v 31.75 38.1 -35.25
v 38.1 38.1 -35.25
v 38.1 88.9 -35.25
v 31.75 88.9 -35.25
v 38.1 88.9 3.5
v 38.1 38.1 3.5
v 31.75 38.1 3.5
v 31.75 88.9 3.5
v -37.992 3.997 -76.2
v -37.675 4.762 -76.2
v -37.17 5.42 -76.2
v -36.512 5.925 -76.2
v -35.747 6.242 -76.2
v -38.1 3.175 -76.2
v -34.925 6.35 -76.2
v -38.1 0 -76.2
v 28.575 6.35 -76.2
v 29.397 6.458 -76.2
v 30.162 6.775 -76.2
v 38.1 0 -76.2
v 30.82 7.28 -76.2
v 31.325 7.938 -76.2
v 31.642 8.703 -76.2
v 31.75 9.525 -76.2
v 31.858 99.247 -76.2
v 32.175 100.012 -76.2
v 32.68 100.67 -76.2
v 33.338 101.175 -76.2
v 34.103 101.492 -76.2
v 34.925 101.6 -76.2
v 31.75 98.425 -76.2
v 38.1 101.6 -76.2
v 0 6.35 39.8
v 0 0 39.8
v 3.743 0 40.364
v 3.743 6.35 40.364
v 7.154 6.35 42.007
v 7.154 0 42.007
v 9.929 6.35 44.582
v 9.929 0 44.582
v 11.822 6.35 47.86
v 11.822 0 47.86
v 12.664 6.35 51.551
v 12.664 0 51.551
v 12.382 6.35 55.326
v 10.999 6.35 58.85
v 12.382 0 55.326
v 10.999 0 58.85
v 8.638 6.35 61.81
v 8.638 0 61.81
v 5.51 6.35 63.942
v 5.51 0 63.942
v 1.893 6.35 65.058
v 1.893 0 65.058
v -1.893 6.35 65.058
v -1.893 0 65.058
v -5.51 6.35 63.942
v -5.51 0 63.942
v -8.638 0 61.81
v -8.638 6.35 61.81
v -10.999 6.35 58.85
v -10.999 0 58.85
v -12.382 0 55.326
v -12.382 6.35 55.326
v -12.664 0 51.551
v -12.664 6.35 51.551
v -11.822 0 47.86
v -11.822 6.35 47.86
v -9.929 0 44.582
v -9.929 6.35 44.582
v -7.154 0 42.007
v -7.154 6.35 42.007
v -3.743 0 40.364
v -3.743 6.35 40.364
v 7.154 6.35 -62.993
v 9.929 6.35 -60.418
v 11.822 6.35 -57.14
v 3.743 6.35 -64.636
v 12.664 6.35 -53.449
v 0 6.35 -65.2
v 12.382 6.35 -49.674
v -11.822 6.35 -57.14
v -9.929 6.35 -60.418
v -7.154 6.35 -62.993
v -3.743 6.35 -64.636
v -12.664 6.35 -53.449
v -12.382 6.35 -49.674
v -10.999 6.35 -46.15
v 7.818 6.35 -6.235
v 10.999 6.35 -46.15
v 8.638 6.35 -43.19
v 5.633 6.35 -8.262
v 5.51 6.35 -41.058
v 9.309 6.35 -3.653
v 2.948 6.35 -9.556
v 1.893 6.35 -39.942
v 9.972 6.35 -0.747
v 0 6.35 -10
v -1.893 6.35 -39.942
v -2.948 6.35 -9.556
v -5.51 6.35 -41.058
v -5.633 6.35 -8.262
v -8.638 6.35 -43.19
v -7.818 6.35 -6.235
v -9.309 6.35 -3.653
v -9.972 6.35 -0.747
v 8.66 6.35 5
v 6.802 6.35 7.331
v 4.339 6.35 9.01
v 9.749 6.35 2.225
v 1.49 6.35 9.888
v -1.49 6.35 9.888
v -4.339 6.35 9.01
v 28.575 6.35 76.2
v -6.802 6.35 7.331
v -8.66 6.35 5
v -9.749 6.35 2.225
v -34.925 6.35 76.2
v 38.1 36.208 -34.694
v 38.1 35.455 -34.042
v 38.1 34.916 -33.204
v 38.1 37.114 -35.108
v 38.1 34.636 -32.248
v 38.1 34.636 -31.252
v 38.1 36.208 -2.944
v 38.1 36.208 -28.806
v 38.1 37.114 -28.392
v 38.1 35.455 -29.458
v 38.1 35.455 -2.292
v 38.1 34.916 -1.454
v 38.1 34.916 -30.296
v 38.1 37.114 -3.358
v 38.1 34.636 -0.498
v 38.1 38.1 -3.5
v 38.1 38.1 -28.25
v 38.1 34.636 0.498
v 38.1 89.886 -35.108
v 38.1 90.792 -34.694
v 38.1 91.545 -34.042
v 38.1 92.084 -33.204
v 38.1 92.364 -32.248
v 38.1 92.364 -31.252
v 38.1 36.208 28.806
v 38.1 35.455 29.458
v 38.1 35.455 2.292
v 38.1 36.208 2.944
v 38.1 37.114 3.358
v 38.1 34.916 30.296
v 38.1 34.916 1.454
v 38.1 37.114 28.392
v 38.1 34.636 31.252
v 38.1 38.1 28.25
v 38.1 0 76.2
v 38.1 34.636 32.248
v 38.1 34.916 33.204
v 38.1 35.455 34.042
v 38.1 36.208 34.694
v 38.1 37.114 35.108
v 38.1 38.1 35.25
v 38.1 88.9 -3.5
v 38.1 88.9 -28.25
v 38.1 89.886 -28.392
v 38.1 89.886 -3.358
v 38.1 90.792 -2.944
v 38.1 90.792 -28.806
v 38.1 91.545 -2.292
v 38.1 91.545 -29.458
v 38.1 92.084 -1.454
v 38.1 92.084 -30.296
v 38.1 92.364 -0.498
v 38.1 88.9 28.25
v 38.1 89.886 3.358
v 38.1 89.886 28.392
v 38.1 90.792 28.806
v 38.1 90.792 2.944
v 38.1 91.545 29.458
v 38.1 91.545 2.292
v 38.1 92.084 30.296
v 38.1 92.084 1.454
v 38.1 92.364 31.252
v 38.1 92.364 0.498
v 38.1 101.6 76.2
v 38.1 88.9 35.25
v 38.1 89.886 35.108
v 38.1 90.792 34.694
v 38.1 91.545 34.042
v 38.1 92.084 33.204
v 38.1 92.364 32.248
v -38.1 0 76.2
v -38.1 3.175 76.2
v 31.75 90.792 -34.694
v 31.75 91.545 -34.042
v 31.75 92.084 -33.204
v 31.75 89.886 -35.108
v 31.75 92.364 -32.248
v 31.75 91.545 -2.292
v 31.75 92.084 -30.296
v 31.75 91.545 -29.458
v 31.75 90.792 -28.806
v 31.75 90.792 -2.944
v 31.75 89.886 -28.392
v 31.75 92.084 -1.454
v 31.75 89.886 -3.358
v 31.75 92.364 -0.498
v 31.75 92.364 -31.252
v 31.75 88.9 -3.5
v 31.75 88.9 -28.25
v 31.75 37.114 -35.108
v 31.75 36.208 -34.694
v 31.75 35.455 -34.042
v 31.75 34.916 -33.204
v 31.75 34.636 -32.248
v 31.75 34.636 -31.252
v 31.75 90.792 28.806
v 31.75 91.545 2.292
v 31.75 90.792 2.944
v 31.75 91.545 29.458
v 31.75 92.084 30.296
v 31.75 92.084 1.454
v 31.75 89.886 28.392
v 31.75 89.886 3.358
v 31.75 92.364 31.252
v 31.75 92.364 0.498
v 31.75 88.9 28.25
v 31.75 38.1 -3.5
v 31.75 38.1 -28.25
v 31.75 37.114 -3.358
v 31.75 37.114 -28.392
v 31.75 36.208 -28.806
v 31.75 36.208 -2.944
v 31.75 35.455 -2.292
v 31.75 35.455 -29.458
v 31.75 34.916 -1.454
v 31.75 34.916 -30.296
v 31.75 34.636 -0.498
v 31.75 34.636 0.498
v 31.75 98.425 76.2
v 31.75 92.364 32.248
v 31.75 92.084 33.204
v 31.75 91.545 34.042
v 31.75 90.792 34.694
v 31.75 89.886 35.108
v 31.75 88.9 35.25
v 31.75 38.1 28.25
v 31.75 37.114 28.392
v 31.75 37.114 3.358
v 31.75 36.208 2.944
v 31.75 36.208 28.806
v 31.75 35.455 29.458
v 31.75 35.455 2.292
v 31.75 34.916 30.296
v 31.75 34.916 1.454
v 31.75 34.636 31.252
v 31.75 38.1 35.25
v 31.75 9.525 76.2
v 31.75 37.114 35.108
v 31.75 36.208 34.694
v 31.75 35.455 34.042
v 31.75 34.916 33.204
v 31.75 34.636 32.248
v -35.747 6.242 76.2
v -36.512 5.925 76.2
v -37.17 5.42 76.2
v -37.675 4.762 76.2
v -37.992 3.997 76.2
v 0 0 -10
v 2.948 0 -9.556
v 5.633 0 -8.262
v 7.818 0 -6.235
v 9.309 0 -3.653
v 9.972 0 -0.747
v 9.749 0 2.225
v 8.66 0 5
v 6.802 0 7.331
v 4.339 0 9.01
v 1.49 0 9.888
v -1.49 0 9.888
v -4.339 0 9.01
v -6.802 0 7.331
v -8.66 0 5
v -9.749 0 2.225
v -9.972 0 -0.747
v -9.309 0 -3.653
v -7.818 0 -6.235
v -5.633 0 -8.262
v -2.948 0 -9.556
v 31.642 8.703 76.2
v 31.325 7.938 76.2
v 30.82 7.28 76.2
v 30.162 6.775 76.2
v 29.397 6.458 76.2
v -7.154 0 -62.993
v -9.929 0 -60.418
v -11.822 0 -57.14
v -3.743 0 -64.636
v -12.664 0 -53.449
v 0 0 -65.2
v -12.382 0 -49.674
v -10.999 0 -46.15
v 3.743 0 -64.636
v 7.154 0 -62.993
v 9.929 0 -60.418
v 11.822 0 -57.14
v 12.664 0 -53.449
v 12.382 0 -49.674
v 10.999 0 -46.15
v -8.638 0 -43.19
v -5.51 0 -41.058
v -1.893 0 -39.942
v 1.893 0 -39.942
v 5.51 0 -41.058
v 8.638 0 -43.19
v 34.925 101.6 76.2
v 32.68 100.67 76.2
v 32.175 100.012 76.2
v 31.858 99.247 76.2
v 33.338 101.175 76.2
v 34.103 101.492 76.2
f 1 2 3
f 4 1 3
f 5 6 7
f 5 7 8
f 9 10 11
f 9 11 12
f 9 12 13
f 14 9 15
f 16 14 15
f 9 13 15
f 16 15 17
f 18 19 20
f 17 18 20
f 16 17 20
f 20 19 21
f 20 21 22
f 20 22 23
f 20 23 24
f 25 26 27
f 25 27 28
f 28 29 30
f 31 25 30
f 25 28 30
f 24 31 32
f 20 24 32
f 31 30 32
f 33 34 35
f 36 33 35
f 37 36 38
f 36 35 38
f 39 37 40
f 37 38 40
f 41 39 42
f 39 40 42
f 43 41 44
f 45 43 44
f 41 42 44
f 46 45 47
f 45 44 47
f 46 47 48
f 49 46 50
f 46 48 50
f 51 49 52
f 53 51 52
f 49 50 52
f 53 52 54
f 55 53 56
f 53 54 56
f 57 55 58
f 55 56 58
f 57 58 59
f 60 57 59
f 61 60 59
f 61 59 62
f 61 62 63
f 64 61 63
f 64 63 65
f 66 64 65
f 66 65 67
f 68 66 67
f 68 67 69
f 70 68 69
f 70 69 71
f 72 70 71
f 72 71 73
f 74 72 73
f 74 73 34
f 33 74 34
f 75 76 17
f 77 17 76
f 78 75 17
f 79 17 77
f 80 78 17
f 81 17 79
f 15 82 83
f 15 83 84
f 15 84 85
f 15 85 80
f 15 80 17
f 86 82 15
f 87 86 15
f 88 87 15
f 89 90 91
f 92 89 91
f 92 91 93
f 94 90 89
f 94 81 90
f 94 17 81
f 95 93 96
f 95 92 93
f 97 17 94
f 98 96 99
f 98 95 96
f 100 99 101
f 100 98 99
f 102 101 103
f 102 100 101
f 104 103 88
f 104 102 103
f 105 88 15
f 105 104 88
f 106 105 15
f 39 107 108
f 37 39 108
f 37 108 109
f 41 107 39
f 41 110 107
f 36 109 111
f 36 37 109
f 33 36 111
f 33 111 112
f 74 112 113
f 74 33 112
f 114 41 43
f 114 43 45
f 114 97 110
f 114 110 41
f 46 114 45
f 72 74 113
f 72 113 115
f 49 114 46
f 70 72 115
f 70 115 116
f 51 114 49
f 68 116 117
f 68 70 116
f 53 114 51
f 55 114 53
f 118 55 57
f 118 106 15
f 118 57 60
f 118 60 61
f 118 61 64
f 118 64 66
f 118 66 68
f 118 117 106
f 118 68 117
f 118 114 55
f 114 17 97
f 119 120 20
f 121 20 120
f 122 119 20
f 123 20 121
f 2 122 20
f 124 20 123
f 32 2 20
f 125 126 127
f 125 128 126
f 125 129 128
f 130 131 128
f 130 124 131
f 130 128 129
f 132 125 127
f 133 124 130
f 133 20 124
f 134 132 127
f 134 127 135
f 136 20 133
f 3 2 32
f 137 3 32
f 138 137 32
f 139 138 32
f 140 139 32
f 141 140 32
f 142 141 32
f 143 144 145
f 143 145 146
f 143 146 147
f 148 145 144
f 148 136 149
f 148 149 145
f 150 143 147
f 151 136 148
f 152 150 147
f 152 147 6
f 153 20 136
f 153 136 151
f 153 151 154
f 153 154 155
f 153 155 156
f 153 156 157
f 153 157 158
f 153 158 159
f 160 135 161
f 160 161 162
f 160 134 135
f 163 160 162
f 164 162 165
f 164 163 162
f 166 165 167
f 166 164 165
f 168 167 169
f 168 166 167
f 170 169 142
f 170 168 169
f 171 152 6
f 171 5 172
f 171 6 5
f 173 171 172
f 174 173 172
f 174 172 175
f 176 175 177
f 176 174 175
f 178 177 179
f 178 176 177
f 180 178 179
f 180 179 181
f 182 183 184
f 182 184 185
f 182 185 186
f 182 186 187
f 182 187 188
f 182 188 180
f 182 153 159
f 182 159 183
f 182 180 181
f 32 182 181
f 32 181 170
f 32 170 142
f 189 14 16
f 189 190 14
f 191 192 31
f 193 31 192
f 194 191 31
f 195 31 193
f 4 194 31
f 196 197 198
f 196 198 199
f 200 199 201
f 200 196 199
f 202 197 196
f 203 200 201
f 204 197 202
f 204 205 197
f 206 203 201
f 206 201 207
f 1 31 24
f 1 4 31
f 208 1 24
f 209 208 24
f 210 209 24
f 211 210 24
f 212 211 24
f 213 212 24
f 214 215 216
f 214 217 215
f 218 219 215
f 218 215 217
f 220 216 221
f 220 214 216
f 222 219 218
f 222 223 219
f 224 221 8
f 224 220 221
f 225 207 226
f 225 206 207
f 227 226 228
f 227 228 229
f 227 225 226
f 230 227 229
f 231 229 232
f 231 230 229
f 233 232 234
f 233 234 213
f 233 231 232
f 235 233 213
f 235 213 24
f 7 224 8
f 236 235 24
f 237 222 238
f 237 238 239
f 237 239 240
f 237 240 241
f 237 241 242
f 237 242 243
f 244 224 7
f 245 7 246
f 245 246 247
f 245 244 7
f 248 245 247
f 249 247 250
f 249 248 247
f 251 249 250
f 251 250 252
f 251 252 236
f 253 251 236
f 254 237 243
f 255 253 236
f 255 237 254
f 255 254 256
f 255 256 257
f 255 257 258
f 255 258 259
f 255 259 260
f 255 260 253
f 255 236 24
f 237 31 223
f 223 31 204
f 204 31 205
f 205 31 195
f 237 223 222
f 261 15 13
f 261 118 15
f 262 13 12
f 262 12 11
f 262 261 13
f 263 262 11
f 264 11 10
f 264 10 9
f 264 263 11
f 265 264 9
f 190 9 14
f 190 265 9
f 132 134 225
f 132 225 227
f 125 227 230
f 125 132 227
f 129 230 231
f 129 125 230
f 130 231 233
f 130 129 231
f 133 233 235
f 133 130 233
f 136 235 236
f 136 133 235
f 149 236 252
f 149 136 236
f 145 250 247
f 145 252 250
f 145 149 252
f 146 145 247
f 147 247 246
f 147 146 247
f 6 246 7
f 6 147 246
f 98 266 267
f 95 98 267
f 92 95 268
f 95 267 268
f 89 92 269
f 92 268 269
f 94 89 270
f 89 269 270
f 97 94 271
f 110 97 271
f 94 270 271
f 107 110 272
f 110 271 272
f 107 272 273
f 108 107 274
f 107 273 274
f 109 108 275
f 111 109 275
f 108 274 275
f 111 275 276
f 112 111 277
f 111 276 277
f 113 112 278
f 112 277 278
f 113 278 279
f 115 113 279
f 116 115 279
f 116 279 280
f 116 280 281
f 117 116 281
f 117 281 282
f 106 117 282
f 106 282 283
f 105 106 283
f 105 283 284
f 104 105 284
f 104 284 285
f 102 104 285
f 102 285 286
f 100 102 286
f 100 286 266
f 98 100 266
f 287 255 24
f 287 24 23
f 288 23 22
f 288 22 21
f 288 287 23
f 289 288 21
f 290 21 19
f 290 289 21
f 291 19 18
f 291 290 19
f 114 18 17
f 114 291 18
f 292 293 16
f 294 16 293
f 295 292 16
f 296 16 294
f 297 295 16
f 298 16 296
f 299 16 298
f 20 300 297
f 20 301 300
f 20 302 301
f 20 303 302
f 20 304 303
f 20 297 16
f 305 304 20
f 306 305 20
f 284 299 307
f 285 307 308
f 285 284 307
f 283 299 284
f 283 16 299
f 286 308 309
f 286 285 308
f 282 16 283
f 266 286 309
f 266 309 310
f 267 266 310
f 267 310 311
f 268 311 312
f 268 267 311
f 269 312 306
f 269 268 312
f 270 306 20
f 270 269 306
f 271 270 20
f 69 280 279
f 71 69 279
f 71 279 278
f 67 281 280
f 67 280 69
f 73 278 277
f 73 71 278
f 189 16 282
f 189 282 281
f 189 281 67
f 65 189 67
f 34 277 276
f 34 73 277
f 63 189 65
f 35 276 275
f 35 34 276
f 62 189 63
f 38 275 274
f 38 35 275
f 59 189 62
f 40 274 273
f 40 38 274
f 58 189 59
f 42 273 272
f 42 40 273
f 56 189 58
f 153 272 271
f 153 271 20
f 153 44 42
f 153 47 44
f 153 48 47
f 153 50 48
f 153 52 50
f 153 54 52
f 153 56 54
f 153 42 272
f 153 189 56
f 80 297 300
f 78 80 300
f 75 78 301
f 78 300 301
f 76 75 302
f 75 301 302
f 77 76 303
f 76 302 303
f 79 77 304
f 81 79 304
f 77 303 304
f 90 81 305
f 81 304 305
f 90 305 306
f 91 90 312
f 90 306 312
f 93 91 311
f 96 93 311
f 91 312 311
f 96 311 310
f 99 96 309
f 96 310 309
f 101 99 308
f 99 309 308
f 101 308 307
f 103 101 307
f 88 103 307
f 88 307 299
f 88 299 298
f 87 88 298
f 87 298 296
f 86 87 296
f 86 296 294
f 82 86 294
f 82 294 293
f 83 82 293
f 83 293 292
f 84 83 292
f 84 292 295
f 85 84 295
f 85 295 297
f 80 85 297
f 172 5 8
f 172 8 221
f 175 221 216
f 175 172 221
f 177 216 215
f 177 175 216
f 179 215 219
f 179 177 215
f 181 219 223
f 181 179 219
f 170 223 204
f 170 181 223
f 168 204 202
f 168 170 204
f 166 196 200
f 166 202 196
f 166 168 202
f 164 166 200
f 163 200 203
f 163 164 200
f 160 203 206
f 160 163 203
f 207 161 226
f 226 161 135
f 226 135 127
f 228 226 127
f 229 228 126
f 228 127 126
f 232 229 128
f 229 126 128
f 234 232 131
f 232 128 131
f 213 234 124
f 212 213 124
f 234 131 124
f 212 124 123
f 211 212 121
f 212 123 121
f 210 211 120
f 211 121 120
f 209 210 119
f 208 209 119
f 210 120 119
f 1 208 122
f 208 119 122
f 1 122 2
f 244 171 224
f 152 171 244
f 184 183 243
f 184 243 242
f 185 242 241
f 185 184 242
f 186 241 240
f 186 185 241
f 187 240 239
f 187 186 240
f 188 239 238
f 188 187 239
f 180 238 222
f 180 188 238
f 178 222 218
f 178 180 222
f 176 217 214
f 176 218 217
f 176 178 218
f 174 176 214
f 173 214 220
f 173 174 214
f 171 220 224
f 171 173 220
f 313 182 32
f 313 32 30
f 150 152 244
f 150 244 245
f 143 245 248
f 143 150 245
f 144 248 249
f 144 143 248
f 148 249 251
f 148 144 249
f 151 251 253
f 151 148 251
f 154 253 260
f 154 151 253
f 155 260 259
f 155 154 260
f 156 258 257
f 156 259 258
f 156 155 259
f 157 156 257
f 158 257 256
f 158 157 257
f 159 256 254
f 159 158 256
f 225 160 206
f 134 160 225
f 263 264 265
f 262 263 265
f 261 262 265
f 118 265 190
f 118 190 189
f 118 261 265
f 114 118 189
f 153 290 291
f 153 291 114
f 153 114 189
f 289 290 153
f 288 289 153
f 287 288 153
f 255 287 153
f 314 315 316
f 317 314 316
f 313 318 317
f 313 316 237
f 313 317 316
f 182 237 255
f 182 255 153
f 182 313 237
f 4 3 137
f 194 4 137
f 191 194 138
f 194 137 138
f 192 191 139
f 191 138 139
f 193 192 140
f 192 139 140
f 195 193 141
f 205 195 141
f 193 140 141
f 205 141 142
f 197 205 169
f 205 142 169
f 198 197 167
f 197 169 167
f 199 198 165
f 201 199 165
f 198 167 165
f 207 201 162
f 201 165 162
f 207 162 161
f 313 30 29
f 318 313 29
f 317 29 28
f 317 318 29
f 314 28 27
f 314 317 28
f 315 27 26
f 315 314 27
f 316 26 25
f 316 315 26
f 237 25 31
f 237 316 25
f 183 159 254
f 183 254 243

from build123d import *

# Parameters (mm, degrees)
BOSS_EXTRUDE1_DEPTH = 76.2
CUT_EXTRUDE1_DEPTH  = 10
SKETCH4_R           = 10
SKETCH4_R_2         = 12.7
CUT_EXTRUDE2_DEPTH  = 10


with BuildPart() as part:
    # Sketch2 → Boss-Extrude1 (new, symmetric)
    with BuildSketch(Plane.XY):
        with BuildLine():
            Line((-38.1, 0), (38.1, 0))
            Line((38.1, 0), (38.1, 101.6))
            Line((38.1, 101.6), (34.925, 101.6))
            ThreePointArc((34.925, 101.6), (32.67993597, 100.67006403), (31.75, 98.425))
            Line((31.75, 98.425), (31.75, 9.525))
            ThreePointArc((31.75, 9.525), (30.82006403, 7.27993597), (28.575, 6.35))
            Line((28.575, 6.35), (-34.925, 6.35))
            ThreePointArc((-34.925, 6.35), (-37.17006403, 5.42006403), (-38.1, 3.175))
            Line((-38.1, 3.175), (-38.1, 0))
        make_face()
    extrude(amount=BOSS_EXTRUDE1_DEPTH, both=True)

    # Sketch3 → Cut-Extrude1 (cut)
    with BuildSketch(Plane(origin=(38.1, 0, 0), x_dir=(0, 0, -1), z_dir=(1, 0, 0))):
        with BuildLine():
            Line((-28.25, 88.9), (-28.25, 38.1))
            ThreePointArc((-28.25, 38.1), (-31.75, 34.6), (-35.25, 38.1))
            Line((-35.25, 38.1), (-35.25, 88.9))
            ThreePointArc((-35.25, 88.9), (-31.75, 92.4), (-28.25, 88.9))
        make_face()
        with BuildLine():
            Line((28.25, 88.9), (28.25, 38.1))
            ThreePointArc((28.25, 38.1), (31.75, 34.6), (35.25, 38.1))
            Line((35.25, 38.1), (35.25, 88.9))
            ThreePointArc((35.25, 88.9), (31.75, 92.4), (28.25, 88.9))
        make_face()
        with BuildLine():
            Line((3.5, 88.9), (3.5, 38.1))
            ThreePointArc((3.5, 38.1), (0, 34.6), (-3.5, 38.1))
            Line((-3.5, 38.1), (-3.5, 88.9))
            ThreePointArc((-3.5, 88.9), (0, 92.4), (3.5, 88.9))
        make_face()
    extrude(amount=-CUT_EXTRUDE1_DEPTH, mode=Mode.SUBTRACT)

    # Sketch4 → Cut-Extrude2 (cut)
    with BuildSketch(Plane.XZ):
        with Locations(Location((0, 0, 0), (0, 0, 270))):
            Circle(SKETCH4_R)
        with Locations(Location((0, 52.5, 0), (0, 0, 270))):
            Circle(SKETCH4_R_2)
        with Locations(Location((0, -52.5, 0), (0, 0, 270))):
            Circle(SKETCH4_R_2)
    extrude(amount=-CUT_EXTRUDE2_DEPTH, mode=Mode.SUBTRACT)


solid = part.part
